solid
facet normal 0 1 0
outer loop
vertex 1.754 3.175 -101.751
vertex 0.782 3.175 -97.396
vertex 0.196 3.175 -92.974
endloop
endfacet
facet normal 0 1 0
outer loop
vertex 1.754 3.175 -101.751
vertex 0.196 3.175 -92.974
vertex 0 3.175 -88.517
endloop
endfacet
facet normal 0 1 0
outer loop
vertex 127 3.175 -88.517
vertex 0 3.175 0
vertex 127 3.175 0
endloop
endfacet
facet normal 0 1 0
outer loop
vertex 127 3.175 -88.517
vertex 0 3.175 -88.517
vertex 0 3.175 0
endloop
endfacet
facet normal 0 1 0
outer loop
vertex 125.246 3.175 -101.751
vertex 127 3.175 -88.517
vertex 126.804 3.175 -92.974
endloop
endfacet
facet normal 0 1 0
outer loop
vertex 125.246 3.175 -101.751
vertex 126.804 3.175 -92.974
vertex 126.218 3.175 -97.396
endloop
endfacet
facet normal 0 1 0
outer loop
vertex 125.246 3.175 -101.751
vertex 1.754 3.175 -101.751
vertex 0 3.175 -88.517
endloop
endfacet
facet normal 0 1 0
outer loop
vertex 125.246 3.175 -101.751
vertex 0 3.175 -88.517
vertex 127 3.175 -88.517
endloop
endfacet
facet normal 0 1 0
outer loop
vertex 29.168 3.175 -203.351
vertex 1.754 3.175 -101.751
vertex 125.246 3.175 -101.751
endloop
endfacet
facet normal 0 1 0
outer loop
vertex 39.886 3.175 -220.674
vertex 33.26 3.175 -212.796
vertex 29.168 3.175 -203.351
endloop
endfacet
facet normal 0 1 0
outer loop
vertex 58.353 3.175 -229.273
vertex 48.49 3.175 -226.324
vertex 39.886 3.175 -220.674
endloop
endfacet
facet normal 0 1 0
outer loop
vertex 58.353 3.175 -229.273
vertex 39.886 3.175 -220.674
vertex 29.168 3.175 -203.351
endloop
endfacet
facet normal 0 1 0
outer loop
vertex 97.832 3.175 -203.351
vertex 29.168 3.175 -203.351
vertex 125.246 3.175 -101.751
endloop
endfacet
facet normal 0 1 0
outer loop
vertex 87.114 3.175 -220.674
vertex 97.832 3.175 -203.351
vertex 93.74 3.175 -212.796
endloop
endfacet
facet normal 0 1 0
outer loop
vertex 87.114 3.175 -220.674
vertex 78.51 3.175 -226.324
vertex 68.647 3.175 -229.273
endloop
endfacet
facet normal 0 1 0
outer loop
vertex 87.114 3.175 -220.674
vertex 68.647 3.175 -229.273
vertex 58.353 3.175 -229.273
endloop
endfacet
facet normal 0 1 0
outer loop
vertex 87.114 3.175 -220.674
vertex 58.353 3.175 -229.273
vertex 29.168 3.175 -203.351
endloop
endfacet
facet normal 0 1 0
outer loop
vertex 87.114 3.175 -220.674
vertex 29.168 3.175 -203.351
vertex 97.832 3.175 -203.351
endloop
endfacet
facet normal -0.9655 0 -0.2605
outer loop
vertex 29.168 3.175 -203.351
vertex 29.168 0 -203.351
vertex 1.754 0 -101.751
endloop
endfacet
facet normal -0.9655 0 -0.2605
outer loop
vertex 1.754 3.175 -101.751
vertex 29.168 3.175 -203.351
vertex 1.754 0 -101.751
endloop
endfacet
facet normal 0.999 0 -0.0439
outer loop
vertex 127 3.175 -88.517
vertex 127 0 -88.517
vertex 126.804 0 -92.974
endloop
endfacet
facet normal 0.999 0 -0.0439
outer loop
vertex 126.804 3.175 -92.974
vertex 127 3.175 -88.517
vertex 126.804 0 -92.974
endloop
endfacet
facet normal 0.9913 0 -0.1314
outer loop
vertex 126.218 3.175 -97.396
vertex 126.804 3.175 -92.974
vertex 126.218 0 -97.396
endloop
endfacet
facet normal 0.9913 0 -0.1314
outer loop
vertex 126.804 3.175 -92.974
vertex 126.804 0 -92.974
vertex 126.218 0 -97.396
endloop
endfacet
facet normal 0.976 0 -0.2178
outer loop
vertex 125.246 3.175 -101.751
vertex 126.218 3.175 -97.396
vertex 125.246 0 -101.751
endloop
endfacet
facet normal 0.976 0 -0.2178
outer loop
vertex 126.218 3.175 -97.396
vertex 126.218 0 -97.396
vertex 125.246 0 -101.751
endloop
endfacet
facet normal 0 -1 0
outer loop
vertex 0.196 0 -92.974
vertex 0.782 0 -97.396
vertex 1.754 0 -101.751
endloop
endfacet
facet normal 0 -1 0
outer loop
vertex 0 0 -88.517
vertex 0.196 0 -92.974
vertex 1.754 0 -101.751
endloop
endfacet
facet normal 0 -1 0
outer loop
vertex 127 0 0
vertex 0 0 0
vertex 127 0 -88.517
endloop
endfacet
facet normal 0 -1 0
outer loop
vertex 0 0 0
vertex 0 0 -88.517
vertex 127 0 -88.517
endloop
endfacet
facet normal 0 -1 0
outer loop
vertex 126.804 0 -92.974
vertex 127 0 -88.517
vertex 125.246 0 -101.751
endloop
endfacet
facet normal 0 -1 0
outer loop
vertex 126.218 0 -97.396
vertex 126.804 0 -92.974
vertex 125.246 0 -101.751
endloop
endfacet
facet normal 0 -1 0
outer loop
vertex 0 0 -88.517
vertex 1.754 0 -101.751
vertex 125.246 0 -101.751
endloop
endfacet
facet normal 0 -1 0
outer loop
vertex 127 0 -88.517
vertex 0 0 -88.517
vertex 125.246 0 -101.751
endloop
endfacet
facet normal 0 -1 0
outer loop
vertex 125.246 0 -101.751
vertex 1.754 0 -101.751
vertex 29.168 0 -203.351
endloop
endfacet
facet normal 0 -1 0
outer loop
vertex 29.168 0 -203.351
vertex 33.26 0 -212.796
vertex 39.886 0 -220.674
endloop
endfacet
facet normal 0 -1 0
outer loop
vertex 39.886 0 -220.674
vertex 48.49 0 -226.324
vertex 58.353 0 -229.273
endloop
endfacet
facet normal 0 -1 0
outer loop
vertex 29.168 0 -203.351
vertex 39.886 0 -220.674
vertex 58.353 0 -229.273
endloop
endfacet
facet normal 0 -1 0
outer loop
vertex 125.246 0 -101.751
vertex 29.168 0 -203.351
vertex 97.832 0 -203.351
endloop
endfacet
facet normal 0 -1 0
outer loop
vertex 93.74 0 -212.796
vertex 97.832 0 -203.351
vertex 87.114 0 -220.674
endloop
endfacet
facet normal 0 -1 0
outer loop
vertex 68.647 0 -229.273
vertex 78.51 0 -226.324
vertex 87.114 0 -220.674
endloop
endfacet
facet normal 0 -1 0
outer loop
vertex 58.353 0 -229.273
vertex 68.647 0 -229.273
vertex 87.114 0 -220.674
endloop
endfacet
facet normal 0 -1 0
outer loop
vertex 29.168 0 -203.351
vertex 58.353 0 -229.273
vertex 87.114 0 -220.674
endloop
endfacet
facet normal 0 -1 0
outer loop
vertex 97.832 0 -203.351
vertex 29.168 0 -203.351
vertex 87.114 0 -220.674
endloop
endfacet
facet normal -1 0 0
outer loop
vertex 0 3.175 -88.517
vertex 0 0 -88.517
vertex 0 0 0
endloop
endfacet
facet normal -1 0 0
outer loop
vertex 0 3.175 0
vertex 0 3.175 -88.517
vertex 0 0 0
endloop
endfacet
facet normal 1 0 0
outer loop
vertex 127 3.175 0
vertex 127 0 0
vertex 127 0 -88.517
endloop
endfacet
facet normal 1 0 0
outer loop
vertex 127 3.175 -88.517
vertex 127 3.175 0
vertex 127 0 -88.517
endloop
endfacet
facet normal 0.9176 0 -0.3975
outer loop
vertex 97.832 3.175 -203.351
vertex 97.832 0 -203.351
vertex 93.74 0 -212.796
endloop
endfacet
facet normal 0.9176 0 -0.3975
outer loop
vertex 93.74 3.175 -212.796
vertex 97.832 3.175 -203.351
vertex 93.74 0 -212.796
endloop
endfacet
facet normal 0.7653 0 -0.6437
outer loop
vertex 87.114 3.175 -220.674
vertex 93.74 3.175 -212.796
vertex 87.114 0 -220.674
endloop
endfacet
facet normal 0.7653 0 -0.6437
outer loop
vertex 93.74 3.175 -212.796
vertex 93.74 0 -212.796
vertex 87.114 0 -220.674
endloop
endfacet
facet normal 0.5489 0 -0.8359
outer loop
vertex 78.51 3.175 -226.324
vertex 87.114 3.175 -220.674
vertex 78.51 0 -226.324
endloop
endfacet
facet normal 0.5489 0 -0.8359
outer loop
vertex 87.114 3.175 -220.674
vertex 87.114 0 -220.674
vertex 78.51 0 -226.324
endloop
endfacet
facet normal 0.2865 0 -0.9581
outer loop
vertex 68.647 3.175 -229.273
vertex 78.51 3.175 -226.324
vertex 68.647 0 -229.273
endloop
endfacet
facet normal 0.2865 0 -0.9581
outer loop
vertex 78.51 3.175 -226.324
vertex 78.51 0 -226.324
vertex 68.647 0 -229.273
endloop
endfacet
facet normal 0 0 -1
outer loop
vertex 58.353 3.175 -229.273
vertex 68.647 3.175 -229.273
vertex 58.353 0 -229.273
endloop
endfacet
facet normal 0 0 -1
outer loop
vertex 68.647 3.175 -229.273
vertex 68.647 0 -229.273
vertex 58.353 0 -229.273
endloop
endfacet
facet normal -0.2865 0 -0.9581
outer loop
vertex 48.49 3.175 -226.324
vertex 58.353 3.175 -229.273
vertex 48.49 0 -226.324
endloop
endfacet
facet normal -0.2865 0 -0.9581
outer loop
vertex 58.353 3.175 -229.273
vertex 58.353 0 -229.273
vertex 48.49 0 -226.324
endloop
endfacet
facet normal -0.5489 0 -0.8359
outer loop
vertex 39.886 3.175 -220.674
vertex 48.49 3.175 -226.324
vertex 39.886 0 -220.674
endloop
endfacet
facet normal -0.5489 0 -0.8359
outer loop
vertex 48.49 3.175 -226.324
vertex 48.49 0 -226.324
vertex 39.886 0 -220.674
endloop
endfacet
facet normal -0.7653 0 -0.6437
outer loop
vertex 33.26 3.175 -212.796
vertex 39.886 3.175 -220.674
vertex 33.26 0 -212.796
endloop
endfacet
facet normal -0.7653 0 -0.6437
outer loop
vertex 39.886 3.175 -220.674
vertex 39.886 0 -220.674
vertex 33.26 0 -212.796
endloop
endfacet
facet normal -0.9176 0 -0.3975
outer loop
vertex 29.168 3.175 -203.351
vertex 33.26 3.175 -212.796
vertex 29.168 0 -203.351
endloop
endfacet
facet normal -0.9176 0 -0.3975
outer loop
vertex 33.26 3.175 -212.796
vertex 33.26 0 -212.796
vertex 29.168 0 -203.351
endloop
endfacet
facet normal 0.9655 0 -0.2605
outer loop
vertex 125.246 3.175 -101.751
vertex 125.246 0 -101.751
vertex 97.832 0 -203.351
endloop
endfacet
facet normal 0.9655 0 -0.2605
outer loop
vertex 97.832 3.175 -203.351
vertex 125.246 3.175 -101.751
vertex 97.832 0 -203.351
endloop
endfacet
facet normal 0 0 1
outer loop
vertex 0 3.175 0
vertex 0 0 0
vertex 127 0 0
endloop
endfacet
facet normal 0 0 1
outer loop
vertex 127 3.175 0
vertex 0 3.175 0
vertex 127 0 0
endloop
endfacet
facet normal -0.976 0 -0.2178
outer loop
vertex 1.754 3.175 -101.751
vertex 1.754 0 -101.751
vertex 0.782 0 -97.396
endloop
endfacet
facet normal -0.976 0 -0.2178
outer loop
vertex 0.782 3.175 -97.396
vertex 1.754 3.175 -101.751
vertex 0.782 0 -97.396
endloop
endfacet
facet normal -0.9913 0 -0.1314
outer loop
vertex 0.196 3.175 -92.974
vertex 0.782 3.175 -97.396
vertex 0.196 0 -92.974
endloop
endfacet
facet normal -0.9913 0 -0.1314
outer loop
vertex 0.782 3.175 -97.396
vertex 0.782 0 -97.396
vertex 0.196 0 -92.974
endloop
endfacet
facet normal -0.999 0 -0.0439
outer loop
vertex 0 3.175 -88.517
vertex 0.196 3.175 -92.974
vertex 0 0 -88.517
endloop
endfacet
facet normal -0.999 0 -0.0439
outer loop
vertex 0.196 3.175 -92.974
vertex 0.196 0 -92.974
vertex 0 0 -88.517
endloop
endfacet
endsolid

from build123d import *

# Parameters (mm, degrees)
BOSS_EXTRUDE2_DEPTH = 3.175


with BuildPart() as part:
    # Sketch1 → Boss-Extrude2 (new body)
    with BuildSketch(Plane(origin=(0, 0, 0), x_dir=(1, 0, 0), z_dir=(0, 1, 0))):
        with BuildLine():
            Line((0, 0), (127, 0))
            Line((127, 0), (127, 88.516943855))
            ThreePointArc((127, 88.516943855), (126.559592816, 95.191628223), (125.246007425, 101.750581135))
            Line((125.246007425, 101.750581135), (97.832205198, 203.350581135))
            ThreePointArc((97.832205198, 203.350581135), (63.5, 229.647035039), (29.167794802, 203.350581135))
            Line((29.167794802, 203.350581135), (1.753992575, 101.750581135))
            ThreePointArc((1.753992575, 101.750581135), (0.440407184, 95.191628223), (0, 88.516943855))
            Line((0, 88.516943855), (0, 0))
        make_face()
    extrude(amount=BOSS_EXTRUDE2_DEPTH)


solid = part.part
